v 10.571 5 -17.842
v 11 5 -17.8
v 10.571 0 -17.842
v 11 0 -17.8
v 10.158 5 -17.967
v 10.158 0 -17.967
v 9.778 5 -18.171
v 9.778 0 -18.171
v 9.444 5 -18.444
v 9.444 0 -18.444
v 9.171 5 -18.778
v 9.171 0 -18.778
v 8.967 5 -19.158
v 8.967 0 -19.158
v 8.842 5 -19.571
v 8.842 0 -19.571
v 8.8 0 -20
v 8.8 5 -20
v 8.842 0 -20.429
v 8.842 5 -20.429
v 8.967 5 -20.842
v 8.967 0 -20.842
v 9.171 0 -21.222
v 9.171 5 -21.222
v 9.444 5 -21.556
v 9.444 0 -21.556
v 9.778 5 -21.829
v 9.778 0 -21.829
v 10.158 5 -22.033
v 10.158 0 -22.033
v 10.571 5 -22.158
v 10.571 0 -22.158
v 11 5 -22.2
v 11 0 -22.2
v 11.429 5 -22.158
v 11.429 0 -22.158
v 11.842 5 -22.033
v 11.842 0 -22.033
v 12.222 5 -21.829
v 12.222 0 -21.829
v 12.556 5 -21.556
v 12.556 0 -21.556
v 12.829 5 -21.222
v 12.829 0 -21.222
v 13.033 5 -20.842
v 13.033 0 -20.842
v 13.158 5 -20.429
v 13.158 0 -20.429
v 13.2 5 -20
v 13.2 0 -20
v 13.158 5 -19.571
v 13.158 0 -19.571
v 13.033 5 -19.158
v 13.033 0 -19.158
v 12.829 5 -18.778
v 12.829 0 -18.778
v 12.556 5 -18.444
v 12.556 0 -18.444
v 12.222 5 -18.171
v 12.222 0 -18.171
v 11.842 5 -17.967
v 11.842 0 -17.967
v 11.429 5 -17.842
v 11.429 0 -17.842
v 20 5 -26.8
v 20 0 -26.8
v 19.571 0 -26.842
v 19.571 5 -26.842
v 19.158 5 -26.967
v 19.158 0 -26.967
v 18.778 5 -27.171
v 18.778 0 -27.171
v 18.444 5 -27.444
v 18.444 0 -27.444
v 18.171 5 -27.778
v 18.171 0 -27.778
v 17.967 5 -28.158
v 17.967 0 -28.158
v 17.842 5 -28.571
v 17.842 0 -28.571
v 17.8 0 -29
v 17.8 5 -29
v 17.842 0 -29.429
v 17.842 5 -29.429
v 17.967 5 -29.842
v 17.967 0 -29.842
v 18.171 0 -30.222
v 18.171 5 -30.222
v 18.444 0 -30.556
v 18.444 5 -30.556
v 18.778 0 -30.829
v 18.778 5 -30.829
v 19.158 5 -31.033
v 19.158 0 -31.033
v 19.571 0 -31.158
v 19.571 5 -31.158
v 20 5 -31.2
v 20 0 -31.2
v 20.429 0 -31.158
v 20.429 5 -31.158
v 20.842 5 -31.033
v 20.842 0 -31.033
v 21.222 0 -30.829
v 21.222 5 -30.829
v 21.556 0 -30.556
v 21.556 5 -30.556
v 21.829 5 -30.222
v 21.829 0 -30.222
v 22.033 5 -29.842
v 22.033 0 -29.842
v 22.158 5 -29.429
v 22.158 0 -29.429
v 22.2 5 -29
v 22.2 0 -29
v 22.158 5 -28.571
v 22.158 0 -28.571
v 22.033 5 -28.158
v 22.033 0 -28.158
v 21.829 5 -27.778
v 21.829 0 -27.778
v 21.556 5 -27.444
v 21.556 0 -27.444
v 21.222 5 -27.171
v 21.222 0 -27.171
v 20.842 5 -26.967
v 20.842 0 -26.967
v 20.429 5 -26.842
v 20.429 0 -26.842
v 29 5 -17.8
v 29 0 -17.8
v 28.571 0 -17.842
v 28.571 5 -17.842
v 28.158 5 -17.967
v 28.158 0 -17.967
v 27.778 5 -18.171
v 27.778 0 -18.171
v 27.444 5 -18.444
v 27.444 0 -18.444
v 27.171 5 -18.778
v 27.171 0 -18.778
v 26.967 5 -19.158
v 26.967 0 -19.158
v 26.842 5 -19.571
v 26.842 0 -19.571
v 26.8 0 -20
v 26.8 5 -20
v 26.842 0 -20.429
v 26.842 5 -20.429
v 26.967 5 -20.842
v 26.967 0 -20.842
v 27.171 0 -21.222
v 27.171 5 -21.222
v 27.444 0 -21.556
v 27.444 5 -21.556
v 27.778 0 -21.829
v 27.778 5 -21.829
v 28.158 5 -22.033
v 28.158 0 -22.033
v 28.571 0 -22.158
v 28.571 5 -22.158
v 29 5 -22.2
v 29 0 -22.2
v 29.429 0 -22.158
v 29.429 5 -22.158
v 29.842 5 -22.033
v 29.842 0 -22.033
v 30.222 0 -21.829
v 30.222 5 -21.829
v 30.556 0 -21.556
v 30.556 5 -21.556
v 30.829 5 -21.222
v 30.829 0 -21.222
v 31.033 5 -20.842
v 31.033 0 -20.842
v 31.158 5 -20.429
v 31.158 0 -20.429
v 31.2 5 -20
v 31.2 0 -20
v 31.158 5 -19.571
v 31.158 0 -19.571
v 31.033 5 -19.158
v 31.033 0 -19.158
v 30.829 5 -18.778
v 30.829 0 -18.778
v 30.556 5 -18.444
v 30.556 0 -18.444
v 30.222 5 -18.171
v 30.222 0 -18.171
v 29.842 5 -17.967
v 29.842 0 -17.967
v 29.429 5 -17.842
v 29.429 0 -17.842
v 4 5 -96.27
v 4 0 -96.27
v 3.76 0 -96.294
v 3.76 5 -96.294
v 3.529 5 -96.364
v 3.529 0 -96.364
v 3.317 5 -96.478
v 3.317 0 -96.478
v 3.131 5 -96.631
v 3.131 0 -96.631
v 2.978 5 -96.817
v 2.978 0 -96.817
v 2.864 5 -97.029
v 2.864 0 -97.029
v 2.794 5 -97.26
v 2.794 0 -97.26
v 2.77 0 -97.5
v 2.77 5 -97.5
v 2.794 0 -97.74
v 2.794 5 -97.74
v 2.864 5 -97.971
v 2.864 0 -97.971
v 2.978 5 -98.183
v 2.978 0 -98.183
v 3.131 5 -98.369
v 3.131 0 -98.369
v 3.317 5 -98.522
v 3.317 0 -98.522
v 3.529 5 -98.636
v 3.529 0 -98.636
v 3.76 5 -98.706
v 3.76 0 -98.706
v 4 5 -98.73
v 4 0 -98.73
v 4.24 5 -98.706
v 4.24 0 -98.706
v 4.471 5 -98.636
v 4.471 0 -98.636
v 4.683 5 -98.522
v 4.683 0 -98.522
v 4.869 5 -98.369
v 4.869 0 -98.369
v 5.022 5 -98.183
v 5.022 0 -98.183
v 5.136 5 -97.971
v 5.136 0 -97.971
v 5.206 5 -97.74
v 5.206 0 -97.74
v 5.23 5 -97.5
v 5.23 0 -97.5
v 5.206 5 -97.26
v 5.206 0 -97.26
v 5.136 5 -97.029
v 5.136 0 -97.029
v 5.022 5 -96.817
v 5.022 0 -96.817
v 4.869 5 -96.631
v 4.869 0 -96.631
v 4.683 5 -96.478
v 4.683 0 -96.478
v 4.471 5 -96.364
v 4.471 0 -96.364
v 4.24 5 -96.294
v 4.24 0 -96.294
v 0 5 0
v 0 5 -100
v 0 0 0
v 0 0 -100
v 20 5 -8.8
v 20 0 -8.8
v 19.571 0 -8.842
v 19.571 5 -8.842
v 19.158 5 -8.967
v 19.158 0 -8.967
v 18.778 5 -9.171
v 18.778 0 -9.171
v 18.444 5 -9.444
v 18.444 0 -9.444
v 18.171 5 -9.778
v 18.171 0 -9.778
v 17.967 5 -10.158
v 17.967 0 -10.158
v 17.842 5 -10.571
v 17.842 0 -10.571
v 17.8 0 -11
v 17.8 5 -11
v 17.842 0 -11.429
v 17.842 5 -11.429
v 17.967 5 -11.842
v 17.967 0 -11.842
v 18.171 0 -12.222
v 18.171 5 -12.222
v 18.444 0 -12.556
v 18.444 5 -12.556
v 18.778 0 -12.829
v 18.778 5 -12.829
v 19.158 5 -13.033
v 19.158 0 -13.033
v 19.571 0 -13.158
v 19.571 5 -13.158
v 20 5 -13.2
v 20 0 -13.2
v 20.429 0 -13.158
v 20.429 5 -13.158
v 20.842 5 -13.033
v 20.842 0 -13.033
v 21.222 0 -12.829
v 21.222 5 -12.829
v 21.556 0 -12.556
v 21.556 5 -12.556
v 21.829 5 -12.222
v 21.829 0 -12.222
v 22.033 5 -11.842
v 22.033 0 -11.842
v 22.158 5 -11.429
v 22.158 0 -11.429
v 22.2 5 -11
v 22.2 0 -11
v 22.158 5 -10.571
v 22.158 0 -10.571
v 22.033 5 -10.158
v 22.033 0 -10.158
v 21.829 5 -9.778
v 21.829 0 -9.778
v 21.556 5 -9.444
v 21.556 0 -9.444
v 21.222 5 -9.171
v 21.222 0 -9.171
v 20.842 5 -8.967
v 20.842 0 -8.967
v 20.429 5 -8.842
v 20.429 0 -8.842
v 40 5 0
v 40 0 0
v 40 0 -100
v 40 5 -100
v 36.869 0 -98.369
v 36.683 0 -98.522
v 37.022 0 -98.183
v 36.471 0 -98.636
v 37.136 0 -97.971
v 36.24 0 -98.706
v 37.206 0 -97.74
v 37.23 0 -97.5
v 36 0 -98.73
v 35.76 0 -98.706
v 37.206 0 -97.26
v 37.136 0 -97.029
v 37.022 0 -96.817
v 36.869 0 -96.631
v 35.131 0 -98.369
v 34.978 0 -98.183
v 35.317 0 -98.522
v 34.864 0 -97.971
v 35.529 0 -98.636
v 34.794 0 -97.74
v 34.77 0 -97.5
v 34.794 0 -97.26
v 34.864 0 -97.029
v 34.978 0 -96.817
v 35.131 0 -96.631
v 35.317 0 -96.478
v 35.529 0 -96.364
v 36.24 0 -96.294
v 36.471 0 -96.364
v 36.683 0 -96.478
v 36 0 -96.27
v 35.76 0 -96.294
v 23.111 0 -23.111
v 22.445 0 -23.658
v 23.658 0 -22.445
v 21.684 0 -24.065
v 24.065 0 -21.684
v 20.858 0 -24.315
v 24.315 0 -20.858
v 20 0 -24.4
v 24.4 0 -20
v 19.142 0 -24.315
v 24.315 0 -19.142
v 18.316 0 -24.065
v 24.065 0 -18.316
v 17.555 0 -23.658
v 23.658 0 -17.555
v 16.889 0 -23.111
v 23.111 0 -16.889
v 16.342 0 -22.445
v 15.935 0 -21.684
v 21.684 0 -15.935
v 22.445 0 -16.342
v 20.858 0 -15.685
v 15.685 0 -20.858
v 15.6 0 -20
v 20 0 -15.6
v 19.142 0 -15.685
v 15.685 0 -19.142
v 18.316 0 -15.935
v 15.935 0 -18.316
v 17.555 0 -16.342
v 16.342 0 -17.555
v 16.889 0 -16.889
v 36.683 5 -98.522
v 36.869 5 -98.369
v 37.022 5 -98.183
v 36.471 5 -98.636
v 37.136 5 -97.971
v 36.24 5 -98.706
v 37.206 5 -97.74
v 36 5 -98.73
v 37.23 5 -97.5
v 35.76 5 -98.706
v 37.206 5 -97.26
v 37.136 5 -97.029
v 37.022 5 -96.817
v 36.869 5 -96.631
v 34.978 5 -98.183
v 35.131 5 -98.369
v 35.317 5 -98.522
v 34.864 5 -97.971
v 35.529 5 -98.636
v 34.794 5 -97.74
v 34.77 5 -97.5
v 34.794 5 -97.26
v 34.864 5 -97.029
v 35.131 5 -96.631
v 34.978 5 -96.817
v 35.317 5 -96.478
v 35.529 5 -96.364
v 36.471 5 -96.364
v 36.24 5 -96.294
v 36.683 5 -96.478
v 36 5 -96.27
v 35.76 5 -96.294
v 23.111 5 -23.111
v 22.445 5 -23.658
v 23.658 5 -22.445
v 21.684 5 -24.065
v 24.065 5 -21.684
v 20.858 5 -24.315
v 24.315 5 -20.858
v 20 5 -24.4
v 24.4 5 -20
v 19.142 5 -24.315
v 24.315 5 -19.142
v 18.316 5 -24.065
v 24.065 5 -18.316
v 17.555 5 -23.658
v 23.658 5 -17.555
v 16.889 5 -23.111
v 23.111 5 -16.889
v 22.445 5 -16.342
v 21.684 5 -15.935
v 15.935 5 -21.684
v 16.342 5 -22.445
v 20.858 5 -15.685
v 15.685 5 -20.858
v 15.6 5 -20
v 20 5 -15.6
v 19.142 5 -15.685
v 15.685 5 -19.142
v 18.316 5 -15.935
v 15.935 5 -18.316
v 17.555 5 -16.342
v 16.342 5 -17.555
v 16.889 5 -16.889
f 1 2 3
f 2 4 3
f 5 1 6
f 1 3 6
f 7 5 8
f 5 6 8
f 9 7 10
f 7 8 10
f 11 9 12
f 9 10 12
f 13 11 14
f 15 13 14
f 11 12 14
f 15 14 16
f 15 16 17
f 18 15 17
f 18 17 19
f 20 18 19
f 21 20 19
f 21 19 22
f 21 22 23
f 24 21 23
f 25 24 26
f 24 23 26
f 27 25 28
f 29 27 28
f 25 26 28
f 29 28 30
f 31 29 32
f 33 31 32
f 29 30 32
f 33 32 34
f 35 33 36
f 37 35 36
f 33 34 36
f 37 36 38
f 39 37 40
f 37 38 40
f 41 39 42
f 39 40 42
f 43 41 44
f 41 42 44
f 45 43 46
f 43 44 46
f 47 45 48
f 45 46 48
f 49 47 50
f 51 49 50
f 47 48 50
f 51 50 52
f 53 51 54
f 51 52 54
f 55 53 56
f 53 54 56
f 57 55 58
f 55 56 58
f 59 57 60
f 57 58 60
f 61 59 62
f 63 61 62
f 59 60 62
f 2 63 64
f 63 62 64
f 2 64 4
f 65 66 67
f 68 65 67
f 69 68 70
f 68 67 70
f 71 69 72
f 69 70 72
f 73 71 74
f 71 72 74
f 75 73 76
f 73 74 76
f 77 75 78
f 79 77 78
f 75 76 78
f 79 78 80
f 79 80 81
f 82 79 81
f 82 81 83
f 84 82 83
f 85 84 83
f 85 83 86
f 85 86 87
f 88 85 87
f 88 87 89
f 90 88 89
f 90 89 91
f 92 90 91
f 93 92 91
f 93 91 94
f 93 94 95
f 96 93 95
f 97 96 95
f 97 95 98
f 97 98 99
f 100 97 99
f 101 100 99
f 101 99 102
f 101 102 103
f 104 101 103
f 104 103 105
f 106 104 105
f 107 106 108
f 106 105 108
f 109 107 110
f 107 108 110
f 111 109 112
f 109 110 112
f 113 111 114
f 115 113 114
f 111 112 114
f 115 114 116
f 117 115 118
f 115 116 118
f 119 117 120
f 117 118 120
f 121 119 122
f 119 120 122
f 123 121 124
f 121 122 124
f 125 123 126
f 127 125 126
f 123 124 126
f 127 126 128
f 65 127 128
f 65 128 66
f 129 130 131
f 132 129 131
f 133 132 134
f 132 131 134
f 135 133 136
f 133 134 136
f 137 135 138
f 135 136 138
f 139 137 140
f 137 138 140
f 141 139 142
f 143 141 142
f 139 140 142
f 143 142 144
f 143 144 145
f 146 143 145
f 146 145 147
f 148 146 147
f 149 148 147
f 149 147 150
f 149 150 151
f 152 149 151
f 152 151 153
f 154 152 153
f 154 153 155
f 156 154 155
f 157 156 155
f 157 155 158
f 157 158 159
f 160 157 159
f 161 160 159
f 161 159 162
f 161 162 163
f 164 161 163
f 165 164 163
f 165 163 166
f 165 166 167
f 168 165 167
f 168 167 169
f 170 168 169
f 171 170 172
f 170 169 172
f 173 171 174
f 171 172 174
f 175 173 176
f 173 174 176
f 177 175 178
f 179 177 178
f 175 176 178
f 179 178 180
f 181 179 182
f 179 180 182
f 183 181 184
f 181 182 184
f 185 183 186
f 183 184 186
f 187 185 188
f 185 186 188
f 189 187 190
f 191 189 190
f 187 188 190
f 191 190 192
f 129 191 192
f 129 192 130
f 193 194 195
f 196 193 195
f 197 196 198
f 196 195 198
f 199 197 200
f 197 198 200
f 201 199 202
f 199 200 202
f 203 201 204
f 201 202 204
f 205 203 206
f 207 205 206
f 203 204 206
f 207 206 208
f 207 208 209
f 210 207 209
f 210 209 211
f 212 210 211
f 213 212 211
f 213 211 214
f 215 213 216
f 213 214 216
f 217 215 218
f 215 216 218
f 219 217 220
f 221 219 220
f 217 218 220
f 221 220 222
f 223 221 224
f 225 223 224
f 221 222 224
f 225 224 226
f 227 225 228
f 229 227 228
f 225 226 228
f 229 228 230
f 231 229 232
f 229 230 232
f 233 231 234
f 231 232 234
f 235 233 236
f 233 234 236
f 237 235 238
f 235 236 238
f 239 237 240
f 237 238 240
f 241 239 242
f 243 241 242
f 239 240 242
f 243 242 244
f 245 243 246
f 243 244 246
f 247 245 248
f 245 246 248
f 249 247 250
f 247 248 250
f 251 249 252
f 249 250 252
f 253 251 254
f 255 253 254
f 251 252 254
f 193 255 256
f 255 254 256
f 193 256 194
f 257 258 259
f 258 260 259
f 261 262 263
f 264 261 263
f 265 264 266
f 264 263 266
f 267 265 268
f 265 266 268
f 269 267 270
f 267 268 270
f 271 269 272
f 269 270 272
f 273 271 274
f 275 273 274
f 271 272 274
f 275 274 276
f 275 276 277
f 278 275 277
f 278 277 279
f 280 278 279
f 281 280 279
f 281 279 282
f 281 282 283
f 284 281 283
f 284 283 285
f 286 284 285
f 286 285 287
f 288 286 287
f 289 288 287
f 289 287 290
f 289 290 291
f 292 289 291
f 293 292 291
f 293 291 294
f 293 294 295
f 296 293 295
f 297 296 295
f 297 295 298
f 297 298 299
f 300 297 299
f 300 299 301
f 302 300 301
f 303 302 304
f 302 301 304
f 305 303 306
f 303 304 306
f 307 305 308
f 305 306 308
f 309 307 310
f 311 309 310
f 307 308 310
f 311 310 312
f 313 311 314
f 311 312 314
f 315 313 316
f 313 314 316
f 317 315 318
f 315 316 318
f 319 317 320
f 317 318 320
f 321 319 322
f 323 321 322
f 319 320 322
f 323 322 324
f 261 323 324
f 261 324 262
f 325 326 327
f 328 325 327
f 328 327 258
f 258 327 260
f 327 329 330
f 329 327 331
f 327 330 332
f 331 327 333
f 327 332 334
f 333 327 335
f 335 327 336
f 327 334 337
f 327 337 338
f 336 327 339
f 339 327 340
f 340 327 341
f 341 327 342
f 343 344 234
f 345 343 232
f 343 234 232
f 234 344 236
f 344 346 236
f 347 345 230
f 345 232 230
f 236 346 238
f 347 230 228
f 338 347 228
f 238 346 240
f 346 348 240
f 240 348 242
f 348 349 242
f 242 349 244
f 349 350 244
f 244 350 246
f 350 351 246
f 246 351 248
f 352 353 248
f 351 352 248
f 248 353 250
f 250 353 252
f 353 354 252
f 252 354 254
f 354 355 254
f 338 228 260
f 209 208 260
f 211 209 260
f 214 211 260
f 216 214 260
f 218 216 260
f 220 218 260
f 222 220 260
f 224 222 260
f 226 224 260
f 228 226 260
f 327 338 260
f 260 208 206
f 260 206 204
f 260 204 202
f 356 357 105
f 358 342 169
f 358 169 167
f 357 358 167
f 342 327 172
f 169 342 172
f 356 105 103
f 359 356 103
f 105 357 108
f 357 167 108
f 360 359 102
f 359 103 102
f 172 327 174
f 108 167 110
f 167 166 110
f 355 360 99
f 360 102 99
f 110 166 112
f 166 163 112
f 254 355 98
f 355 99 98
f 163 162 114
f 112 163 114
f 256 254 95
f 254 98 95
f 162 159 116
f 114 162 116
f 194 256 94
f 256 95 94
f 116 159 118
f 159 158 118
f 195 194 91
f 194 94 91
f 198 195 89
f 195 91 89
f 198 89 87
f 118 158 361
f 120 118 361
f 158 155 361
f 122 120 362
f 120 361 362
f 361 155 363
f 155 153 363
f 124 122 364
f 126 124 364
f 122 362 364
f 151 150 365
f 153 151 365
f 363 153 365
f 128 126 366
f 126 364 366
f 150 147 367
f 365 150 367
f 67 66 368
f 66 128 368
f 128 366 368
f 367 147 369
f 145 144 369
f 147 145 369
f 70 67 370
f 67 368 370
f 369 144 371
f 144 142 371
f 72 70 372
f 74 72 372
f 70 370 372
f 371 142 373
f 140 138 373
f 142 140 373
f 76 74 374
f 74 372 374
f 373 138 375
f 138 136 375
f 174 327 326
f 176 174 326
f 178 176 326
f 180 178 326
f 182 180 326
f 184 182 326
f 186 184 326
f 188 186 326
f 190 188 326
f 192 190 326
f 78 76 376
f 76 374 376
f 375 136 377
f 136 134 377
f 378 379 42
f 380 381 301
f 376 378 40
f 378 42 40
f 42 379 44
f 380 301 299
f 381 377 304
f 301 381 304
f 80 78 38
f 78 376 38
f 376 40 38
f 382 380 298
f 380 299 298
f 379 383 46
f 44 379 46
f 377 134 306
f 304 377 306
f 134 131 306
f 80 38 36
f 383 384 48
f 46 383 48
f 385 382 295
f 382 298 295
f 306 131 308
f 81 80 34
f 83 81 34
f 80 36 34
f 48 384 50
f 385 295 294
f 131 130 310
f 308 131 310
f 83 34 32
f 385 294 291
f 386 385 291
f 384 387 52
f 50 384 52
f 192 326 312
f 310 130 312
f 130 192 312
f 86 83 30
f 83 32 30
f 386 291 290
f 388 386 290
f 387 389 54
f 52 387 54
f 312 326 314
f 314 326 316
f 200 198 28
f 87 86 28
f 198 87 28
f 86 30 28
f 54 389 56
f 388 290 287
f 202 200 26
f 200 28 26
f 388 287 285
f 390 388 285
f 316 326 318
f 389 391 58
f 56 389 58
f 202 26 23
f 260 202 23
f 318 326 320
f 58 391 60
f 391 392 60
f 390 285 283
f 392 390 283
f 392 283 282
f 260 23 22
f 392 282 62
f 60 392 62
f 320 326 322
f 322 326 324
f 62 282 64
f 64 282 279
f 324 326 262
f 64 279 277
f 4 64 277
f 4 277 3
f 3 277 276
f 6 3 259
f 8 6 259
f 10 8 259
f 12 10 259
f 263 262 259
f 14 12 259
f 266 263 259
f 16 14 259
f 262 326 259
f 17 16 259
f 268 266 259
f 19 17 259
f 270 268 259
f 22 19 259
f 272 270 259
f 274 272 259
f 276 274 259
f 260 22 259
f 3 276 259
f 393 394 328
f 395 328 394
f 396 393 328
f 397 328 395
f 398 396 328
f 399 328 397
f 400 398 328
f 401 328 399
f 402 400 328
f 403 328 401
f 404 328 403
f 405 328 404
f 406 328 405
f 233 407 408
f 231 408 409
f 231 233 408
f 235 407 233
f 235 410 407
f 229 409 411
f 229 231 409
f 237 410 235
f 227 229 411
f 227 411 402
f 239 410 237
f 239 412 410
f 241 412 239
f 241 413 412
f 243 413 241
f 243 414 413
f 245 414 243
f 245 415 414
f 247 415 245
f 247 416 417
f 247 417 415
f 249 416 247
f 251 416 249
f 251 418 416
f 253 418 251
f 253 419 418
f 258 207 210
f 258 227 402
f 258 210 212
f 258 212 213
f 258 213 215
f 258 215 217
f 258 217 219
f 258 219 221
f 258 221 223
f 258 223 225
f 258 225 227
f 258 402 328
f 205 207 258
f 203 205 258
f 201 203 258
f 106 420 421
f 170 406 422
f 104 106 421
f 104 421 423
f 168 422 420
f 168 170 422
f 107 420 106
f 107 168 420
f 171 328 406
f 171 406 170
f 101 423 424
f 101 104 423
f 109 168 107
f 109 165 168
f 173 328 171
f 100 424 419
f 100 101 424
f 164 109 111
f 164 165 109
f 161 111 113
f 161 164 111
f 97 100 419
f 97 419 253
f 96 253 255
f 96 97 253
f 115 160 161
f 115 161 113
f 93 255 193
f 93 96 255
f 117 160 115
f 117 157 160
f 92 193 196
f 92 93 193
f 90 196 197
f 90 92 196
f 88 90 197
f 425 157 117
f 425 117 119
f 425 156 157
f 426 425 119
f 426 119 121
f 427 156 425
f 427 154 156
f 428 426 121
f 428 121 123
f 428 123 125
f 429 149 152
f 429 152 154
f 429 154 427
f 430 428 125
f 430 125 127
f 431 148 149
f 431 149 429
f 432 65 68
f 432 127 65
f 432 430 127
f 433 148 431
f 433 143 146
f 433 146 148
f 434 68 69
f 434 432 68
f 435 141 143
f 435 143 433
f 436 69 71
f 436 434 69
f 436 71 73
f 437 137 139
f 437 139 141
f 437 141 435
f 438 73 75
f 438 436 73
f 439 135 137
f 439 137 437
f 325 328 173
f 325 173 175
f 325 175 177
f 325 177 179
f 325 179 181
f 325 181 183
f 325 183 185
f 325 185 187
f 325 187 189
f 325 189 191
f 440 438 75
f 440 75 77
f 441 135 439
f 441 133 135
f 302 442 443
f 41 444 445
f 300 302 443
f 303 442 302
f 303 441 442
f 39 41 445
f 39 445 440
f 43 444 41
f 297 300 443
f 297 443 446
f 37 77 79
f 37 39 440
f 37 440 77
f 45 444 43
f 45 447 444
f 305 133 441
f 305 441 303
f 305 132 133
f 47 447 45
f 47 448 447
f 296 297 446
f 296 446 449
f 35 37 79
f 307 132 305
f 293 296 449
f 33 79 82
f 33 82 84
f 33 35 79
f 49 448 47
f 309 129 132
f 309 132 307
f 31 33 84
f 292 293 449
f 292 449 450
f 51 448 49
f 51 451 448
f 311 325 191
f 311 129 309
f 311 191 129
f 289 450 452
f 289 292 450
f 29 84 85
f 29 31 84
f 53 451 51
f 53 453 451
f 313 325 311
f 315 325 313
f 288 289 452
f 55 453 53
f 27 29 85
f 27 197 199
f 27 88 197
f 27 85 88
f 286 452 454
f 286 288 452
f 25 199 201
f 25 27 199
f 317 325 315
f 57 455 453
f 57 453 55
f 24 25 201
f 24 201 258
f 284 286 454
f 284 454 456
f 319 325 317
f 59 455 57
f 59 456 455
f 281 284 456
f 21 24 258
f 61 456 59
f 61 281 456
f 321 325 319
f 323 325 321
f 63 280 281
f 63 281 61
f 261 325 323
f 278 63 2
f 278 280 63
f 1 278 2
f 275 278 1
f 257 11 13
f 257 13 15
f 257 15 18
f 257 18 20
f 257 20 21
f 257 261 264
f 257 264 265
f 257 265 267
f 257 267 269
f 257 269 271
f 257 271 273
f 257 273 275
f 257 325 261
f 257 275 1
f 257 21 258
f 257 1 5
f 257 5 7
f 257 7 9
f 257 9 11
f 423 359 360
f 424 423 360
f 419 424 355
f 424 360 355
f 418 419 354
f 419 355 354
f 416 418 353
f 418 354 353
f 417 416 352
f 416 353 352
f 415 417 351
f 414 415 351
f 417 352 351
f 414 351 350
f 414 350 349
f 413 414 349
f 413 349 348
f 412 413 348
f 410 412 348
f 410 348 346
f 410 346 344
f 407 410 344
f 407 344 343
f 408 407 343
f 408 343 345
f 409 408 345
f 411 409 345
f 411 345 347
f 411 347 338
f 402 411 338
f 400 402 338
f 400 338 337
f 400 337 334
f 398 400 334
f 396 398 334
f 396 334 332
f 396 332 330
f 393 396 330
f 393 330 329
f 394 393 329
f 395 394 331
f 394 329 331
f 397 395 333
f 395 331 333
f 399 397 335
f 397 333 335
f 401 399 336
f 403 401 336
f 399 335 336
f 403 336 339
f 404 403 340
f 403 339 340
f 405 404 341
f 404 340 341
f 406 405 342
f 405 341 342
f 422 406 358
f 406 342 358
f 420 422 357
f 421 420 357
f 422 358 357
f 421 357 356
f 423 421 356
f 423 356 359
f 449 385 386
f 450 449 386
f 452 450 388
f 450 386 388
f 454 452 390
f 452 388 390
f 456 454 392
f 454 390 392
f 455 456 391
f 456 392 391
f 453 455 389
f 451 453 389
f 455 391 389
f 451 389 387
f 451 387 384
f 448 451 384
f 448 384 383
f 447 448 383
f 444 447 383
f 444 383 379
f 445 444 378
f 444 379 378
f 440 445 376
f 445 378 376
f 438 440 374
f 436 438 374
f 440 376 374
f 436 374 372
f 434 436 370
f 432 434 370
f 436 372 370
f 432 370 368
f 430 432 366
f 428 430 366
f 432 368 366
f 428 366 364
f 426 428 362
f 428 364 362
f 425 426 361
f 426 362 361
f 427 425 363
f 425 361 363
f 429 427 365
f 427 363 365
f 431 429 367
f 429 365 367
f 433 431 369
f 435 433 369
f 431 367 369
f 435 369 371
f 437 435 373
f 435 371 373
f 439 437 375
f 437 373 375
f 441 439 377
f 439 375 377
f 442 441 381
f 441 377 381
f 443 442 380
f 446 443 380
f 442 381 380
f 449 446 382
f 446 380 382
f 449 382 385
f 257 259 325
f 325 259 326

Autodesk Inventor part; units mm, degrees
ref_plane "YZ Plane" through (0, 0, 0) normal (1, 0, 0) x (0, 1, 0)
ref_plane "XZ Plane" through (0, 0, 0) normal (0, 1, 0) x (-1, 0, 0)
ref_plane "XY Plane" through (0, 0, 0) normal (0, 0, 1) x (1, 0, 0)
sketch "スケッチ1" plane through (0, 0, 0) normal (0, 1, 0) x (-1, 0, 0)
  line L0 (0, 0) -> (-40, 0)
  line L1 (-40, 0) -> (-40, -100)
  line L2 (-40, -100) -> (0, -100)
  line L3 (0, -100) -> (0, 0)
  dimension "d0" = 40
  dimension "d1" = 100
extrude "押し出し1" add sketch "スケッチ1" along normal blind 5
sketch "スケッチ2" plane through (0, 5, 0) normal (0, 1, 0) x (1, 0, 0)
  line L0 (0, 0) -> (40, 0) construction
  line L1 (20, 0) -> (20, 100) construction
  line L2 (40, 100) -> (0, 100) construction
  point P0 (20, 20)
  dimension "d4" = 20
hole "穴1" at (20, 5, -20) direction (0, -1, 0) diameter 8.8 end through all
sketch "スケッチ3" plane through (0, 5, 0) normal (0, 1, 0) x (1, 0, 0)
  circle A0 centre (20, 20) radius 4.4 construction
  circle A1 centre (20, 20) radius 9 construction
  point P0 (0, 0)
  point P1 (11, 20)
  point P2 (20, 11)
  point P3 (29, 20)
  point P4 (20, 29)
  dimension "d12" = 18
  dimension "d15" = 360
hole "穴2" at (11, 5, -20) at (20, 5, -11) at (29, 5, -20) at (20, 5, -29) direction (0, -1, 0) diameter 4.4 end through all
sketch "スケッチ4" plane through (0, 5, 0) normal (0, 1, 0) x (1, 0, 0)
  line L0 (40, 100) -> (0, 100) construction
  line L1 (0, 100) -> (40, 100) construction
  line L2 (40, 100) -> (40, 95) construction
  line L3 (40, 95) -> (0, 95) construction
  line L4 (0, 95) -> (0, 100) construction
  line L5 (0, 100) -> (0, 0) projected
  line L6 (0, 97.5) -> (40, 97.5) construction
  line L7 (40, 0) -> (40, 100) projected
  point P0 (4, 97.5)
  point P1 (36, 97.5)
  dimension "d25" = 5
  dimension "d26" = 4
  dimension "d27" = 4
hole "穴3" at (4, 5, -97.5) at (36, 5, -97.5) direction (0, -1, 0) diameter 2.459 end through all thread size "M3x0.5" class "6H" standard "ISO Metric profile"
properties part number "shoulder1_sidel_plate"
